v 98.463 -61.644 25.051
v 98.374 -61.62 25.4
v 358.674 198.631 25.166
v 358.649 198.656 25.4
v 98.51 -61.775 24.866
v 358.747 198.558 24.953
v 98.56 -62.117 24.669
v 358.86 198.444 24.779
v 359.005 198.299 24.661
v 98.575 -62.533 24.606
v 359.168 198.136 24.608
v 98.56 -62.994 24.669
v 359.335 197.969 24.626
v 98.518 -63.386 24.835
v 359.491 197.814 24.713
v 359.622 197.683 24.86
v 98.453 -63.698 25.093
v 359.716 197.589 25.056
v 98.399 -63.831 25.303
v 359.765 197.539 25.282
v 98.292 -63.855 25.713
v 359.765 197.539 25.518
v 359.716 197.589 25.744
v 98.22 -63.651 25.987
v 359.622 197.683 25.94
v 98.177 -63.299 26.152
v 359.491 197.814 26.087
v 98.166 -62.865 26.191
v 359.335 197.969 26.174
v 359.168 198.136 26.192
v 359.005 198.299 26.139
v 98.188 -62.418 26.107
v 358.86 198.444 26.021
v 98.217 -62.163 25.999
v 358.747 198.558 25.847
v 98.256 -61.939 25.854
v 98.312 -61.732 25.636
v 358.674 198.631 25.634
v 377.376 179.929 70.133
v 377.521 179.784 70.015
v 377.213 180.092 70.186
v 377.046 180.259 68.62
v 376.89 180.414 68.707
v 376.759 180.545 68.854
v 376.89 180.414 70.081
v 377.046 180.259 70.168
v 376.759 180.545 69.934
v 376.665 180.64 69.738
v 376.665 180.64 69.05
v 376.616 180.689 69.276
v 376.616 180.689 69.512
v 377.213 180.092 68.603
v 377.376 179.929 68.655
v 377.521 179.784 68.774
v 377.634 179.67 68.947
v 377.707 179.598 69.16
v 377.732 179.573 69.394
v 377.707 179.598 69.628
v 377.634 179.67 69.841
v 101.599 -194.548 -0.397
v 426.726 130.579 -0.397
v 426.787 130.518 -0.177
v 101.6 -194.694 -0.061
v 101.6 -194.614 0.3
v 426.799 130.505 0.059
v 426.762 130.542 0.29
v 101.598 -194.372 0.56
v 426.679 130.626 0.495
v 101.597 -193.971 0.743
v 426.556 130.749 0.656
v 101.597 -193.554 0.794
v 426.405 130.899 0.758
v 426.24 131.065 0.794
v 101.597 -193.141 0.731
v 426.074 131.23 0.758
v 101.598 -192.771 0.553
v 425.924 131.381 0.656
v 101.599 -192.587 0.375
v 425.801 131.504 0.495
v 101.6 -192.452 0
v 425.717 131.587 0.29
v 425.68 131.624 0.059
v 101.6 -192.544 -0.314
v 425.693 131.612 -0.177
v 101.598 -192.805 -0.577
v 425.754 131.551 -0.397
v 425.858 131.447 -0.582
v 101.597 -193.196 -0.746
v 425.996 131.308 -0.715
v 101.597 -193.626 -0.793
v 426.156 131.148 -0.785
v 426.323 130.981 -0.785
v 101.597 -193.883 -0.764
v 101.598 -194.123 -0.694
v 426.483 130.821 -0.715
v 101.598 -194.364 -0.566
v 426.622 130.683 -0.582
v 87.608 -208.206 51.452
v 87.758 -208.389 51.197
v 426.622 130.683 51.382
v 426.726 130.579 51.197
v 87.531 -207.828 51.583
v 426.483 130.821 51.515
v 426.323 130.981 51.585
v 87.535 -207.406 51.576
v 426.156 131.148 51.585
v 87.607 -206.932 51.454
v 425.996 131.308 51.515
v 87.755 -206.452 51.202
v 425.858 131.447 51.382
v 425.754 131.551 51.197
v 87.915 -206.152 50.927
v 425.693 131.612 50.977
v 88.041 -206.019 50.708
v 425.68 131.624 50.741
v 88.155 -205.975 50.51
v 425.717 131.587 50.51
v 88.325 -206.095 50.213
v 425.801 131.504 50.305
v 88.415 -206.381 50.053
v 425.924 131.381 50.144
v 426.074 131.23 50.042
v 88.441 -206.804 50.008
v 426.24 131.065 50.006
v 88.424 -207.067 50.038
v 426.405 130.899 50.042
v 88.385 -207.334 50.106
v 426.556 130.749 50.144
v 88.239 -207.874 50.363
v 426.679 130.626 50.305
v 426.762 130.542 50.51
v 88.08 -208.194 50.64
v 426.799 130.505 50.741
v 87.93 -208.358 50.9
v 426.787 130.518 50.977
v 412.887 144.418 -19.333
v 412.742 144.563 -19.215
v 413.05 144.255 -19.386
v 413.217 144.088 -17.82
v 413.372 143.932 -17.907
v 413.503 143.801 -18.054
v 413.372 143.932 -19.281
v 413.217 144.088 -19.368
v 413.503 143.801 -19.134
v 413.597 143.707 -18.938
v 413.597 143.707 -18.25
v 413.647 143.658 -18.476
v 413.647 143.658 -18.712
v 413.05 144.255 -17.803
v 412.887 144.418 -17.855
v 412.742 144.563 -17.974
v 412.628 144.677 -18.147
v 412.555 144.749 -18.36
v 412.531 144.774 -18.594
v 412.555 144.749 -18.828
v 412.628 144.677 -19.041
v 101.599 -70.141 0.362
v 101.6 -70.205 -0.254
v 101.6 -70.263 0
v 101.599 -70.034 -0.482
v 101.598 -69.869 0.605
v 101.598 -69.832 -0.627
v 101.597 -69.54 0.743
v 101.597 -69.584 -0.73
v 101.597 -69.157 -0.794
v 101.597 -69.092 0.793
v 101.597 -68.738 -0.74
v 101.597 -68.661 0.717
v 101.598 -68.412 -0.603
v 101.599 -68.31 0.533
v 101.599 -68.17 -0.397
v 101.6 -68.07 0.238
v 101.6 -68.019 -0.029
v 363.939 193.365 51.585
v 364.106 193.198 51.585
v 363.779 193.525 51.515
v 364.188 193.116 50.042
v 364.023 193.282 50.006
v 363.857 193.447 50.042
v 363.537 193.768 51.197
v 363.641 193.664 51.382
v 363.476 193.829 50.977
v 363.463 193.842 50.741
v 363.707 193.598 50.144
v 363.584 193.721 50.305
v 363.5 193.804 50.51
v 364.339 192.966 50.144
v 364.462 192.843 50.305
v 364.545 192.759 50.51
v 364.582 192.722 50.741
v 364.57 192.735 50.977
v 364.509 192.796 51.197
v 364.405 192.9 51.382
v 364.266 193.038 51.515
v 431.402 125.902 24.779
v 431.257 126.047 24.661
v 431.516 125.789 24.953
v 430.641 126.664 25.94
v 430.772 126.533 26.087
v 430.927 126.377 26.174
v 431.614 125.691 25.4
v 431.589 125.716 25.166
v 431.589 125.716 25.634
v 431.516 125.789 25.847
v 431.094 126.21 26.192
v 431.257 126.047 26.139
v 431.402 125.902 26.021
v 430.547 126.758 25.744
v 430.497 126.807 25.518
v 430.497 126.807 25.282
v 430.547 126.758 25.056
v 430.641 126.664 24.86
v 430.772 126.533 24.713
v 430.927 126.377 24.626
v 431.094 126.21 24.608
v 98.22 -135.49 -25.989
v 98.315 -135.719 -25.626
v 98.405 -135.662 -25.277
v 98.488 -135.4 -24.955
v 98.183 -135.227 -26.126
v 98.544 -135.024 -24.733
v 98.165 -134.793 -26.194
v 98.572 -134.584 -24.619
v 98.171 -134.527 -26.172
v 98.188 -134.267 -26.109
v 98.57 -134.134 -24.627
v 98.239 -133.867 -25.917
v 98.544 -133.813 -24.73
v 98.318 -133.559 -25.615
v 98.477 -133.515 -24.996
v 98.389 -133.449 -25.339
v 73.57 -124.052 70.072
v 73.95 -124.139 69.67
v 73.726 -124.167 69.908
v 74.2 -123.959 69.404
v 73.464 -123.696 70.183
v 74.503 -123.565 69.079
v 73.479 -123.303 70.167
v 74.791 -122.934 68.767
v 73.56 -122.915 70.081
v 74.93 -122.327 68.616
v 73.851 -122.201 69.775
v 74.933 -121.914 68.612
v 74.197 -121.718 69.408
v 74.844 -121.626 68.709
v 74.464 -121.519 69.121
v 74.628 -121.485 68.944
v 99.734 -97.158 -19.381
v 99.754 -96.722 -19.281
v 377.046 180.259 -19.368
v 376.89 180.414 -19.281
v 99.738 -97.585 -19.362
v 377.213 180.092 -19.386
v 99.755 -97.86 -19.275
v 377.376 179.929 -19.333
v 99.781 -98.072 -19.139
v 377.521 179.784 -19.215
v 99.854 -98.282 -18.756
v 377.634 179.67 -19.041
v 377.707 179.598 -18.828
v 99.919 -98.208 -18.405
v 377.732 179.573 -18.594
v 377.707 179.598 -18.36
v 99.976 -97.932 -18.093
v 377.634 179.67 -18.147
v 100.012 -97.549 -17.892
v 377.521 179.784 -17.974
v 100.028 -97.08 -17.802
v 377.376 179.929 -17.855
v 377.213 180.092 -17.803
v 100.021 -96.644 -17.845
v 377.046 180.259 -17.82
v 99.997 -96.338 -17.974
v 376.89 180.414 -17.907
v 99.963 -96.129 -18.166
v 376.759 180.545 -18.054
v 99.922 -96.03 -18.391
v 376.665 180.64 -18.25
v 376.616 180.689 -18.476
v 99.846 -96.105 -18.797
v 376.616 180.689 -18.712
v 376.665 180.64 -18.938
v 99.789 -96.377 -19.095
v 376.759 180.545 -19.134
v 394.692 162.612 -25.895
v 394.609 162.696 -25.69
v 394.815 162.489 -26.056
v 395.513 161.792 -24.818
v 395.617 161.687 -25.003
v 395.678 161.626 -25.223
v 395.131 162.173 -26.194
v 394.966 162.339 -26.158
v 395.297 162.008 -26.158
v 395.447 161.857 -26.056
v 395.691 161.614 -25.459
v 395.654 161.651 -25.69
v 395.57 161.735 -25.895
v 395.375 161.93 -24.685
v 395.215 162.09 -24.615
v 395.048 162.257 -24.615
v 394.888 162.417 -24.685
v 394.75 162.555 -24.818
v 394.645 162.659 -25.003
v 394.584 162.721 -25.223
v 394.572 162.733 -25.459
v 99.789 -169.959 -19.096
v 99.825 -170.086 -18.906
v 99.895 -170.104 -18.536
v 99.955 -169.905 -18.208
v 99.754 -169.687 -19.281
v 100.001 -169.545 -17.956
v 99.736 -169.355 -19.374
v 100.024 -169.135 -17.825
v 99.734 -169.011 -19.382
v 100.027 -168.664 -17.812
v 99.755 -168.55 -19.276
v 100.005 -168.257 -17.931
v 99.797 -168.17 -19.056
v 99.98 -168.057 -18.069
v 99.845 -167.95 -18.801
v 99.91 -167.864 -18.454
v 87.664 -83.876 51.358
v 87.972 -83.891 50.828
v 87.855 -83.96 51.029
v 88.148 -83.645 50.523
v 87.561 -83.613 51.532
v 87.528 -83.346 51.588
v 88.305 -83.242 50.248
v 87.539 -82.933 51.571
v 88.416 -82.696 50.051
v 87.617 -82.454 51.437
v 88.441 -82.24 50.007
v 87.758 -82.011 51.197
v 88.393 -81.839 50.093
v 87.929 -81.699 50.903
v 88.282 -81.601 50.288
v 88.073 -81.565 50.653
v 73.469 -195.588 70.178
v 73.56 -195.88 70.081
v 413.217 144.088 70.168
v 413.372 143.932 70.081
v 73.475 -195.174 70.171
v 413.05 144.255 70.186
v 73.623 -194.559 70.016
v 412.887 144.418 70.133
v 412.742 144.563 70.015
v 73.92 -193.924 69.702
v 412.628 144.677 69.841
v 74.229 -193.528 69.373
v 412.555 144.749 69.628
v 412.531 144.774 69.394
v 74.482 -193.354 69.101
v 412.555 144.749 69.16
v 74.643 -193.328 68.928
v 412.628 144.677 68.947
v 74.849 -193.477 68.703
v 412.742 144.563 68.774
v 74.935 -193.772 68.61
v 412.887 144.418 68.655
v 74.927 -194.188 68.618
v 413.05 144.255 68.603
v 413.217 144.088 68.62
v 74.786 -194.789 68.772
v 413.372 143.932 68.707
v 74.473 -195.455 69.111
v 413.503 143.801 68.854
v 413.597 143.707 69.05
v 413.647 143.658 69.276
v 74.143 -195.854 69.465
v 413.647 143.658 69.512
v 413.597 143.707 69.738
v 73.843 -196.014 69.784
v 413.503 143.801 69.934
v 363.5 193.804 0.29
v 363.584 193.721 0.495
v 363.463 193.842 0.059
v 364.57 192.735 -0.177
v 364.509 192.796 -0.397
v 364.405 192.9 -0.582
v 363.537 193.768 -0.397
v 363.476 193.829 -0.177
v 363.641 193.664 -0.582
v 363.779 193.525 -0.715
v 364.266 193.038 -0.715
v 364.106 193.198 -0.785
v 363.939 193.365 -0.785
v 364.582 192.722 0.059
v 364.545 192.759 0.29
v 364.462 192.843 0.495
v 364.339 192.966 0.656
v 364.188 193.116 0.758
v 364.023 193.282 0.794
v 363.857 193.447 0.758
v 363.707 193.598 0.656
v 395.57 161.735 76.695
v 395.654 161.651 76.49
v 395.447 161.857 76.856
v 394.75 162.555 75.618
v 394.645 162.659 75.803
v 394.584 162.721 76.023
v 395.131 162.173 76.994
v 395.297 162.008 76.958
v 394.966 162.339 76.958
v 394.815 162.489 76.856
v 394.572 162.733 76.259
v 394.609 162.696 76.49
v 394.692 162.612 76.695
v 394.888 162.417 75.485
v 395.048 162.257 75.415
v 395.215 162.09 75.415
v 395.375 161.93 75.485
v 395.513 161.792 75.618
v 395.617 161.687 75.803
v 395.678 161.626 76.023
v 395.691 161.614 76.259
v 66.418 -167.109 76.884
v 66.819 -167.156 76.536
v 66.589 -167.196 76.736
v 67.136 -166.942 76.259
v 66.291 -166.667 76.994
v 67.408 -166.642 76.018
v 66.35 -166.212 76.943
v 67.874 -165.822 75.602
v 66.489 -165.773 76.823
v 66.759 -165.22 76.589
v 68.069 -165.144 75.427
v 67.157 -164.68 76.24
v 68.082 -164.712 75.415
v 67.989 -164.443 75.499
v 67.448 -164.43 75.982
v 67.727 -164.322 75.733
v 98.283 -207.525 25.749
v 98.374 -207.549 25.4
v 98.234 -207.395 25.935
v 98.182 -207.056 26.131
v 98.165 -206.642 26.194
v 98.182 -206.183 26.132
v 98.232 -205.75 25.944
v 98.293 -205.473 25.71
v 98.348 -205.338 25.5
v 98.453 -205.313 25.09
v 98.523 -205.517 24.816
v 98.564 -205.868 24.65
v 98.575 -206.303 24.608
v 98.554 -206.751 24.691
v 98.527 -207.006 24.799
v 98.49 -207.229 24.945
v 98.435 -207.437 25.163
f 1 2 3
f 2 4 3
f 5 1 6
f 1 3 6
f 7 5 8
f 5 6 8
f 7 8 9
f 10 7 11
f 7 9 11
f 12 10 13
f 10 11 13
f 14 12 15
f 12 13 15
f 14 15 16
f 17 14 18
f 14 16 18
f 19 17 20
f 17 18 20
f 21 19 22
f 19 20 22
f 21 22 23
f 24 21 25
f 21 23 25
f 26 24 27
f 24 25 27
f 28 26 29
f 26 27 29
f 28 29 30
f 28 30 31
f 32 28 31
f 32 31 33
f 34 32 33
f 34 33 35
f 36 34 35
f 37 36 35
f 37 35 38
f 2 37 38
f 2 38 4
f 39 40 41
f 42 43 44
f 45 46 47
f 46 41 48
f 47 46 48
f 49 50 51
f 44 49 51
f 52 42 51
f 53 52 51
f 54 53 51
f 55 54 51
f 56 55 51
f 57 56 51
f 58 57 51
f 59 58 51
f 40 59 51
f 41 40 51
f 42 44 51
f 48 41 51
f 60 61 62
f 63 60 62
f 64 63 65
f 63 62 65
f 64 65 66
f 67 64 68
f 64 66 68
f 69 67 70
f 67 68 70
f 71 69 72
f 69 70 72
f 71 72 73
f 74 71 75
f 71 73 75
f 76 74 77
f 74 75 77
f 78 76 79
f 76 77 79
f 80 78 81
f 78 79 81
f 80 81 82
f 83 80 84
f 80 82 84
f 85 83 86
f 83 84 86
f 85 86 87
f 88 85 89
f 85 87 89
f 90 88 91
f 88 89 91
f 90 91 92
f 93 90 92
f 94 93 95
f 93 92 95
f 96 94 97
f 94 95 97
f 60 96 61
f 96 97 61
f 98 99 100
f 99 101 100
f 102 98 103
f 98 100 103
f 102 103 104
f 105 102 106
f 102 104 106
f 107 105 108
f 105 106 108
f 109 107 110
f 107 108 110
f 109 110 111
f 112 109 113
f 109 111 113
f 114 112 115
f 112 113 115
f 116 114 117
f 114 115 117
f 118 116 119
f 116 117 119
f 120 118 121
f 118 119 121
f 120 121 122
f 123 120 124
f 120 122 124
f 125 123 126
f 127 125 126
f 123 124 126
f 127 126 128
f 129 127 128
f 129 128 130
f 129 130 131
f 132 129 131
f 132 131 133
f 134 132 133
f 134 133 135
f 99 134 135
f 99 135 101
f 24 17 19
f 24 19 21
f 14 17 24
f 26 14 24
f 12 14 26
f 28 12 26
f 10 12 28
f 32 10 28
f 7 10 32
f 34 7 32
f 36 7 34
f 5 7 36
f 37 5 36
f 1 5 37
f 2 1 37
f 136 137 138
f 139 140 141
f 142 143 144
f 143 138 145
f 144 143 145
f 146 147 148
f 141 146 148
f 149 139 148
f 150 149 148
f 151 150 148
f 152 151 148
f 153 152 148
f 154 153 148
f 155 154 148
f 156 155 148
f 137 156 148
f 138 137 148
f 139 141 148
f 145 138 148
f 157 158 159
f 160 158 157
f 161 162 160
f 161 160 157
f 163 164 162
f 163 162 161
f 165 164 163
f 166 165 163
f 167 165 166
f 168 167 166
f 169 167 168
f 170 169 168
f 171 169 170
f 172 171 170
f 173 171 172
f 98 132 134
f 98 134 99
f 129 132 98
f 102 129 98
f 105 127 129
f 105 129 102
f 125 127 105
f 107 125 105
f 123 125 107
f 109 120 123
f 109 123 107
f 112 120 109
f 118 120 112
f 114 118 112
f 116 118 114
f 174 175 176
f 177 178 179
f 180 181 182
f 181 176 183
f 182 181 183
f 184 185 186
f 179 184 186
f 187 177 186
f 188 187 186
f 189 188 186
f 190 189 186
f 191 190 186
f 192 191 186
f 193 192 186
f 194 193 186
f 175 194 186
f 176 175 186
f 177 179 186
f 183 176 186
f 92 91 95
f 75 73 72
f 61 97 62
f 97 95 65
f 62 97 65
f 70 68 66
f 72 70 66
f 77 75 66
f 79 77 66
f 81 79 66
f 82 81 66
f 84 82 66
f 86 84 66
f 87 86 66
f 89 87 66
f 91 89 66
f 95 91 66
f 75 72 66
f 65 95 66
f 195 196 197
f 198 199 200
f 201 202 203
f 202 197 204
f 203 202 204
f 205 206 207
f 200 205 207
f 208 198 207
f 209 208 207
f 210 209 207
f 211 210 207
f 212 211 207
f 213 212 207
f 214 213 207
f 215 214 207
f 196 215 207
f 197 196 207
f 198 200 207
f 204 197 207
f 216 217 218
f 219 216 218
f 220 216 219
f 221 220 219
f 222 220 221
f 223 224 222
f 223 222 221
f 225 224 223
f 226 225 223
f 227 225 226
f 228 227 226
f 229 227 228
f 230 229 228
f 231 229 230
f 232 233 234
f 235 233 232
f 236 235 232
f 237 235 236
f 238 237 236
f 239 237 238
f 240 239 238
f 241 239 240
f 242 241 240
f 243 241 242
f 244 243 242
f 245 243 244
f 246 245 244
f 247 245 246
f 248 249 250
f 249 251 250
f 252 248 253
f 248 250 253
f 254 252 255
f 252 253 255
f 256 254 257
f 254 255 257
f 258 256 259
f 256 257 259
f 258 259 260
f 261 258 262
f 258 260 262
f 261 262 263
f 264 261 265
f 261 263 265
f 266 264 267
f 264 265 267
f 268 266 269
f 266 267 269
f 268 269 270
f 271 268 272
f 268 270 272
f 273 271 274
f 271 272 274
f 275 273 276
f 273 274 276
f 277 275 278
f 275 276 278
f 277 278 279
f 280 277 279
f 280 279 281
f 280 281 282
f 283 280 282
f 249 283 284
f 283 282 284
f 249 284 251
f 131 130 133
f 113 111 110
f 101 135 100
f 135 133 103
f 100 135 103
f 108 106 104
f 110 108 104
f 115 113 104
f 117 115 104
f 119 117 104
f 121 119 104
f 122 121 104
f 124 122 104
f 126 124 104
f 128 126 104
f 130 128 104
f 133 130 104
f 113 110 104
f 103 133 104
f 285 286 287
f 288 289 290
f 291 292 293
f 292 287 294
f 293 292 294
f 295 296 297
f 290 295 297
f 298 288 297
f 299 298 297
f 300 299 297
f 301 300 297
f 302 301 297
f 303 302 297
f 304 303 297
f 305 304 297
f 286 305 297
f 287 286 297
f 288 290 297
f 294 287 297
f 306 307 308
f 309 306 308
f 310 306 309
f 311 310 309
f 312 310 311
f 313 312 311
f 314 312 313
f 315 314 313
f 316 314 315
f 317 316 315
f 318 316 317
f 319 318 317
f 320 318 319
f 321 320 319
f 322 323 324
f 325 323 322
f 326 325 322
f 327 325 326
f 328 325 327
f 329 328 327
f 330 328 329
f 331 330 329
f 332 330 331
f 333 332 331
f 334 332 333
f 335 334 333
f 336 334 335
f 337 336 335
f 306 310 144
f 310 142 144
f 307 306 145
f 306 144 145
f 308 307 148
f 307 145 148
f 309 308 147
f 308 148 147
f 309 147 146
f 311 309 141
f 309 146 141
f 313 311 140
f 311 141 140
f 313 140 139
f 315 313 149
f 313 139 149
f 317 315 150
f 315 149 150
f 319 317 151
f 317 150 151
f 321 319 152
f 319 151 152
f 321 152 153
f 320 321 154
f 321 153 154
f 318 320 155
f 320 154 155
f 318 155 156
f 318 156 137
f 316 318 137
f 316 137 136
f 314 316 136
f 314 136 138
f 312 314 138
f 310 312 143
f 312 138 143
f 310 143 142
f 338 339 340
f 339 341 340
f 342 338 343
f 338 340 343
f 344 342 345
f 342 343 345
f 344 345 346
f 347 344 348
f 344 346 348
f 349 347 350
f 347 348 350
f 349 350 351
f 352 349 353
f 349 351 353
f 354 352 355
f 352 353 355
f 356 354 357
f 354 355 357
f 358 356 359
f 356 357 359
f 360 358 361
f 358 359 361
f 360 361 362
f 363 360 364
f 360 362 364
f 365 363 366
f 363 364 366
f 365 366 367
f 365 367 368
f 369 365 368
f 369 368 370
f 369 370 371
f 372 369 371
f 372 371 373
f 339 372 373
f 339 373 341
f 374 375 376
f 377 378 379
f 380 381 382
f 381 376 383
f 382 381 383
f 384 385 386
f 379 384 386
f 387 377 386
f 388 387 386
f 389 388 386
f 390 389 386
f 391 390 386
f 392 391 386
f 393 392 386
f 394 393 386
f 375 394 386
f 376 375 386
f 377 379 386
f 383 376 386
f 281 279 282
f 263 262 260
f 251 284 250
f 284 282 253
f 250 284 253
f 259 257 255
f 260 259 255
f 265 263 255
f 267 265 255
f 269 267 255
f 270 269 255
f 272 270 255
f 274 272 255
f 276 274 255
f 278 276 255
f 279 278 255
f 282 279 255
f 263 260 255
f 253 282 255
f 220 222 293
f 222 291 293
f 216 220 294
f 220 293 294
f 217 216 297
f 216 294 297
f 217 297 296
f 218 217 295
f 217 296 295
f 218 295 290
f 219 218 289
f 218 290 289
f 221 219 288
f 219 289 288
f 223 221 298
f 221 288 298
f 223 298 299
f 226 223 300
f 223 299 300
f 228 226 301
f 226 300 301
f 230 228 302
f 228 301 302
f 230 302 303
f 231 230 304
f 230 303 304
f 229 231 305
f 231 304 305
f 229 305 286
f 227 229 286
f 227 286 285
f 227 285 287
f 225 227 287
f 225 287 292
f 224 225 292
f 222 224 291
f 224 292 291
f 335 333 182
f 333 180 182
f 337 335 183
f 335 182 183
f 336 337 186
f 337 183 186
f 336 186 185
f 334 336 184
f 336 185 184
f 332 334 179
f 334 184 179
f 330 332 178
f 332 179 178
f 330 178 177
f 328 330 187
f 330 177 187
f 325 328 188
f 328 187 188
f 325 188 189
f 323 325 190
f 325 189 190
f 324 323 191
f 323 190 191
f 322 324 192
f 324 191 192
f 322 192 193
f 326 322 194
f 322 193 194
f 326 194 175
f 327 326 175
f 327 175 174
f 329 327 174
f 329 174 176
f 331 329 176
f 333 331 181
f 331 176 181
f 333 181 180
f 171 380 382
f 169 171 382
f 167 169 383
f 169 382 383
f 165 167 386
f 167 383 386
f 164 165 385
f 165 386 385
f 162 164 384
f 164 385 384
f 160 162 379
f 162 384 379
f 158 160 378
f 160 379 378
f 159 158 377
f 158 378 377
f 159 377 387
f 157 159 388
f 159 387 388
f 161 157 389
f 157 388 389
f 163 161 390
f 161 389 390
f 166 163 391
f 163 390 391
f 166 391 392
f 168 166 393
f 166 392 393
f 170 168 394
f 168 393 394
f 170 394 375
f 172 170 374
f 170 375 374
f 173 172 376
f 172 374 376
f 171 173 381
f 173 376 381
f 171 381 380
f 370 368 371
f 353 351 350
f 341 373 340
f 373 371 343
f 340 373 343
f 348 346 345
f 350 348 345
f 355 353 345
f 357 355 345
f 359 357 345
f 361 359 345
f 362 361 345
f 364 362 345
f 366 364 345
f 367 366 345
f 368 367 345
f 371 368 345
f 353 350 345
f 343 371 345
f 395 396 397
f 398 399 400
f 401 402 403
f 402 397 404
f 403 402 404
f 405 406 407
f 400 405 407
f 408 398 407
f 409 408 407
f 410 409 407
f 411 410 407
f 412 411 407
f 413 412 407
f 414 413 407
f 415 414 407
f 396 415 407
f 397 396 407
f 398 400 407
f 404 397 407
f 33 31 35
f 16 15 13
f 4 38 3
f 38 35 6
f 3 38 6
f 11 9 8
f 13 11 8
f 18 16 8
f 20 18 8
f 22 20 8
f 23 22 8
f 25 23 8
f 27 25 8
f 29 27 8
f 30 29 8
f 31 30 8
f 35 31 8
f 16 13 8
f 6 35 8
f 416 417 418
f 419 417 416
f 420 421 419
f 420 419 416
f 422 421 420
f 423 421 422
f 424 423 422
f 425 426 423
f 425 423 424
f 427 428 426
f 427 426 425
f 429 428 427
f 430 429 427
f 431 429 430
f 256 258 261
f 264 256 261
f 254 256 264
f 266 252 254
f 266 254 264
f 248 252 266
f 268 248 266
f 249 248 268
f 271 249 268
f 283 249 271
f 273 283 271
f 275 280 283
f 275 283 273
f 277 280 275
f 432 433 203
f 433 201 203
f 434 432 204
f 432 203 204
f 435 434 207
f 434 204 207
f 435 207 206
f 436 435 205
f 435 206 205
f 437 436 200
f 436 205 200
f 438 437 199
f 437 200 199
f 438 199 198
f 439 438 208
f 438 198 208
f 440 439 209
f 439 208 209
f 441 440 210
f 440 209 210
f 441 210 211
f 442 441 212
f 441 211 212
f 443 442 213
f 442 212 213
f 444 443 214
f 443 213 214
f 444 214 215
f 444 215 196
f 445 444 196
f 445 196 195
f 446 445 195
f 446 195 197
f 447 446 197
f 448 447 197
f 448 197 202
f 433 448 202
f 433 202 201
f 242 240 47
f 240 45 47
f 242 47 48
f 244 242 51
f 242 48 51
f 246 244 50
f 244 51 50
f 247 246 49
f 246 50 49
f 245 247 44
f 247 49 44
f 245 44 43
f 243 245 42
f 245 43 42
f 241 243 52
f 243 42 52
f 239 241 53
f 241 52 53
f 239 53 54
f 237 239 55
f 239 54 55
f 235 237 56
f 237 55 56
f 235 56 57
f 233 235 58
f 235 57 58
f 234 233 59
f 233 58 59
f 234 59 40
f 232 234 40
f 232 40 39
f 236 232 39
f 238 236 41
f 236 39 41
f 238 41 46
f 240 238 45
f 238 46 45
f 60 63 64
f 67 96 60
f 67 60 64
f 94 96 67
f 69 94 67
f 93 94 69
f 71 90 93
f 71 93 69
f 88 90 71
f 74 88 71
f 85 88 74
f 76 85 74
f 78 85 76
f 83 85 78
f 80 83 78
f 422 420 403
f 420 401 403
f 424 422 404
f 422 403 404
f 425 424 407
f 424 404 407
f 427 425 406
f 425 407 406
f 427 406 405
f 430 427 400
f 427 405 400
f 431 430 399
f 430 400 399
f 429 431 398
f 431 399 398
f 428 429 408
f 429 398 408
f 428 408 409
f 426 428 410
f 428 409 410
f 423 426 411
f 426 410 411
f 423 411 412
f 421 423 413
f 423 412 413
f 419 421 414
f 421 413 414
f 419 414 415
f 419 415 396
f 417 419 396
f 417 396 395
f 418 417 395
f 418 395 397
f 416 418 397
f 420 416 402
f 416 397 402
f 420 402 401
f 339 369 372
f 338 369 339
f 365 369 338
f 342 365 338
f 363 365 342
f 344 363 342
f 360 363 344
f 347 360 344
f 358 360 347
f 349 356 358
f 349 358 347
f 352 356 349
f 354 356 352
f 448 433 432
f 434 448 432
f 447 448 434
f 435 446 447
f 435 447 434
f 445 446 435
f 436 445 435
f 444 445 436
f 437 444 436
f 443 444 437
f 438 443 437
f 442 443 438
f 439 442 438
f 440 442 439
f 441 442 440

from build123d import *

# Parameters (mm, degrees)
F5_COUNT = 12
F6_R     = 101.6
F7_DEPTH = 305.3622660076


# Not quite as in the source:
# - the program builds the solid bodies; features that only make, move or delete a surface that nothing else refers to are left out


with BuildPart() as f4:
    # F3 (on offset) → F4 (revolve)
    with BuildSketch(Plane.XY.offset(25.4)):
        Polygon((0, -304.8), (0.5612660076, -305.3612660076), (431.6135598189, 125.6910278038), (431.0522938113, 126.2522938113), align=None)
    revolve(axis=Axis((215.5261469057, -89.2738530943, 25.4), (-0.7071067812, -0.7071067812, 0)))


with BuildPart() as f5_1:
    # F5: instance of F4
    add(f4.part.rotate(Axis((179.6051224214, -53.3528286101, 25.4), (0.7071067812, 0.7071067812, 0)), 1 * 360 / F5_COUNT))


with BuildPart() as f5_2:
    # F5: instance of F4
    add(f4.part.rotate(Axis((179.6051224214, -53.3528286101, 25.4), (0.7071067812, 0.7071067812, 0)), 2 * 360 / F5_COUNT))


with BuildPart() as f5_3:
    # F5: instance of F4
    add(f4.part.rotate(Axis((179.6051224214, -53.3528286101, 25.4), (0.7071067812, 0.7071067812, 0)), 3 * 360 / F5_COUNT))


with BuildPart() as f5_4:
    # F5: instance of F4
    add(f4.part.rotate(Axis((179.6051224214, -53.3528286101, 25.4), (0.7071067812, 0.7071067812, 0)), 4 * 360 / F5_COUNT))


with BuildPart() as f5_5:
    # F5: instance of F4
    add(f4.part.rotate(Axis((179.6051224214, -53.3528286101, 25.4), (0.7071067812, 0.7071067812, 0)), 5 * 360 / F5_COUNT))


with BuildPart() as f5_6:
    # F5: instance of F4
    add(f4.part.rotate(Axis((179.6051224214, -53.3528286101, 25.4), (0.7071067812, 0.7071067812, 0)), 6 * 360 / F5_COUNT))


with BuildPart() as f5_7:
    # F5: instance of F4
    add(f4.part.rotate(Axis((179.6051224214, -53.3528286101, 25.4), (0.7071067812, 0.7071067812, 0)), 7 * 360 / F5_COUNT))


with BuildPart() as f5_8:
    # F5: instance of F4
    add(f4.part.rotate(Axis((179.6051224214, -53.3528286101, 25.4), (0.7071067812, 0.7071067812, 0)), 8 * 360 / F5_COUNT))


with BuildPart() as f5_9:
    # F5: instance of F4
    add(f4.part.rotate(Axis((179.6051224214, -53.3528286101, 25.4), (0.7071067812, 0.7071067812, 0)), 9 * 360 / F5_COUNT))


with BuildPart() as f5_10:
    # F5: instance of F4
    add(f4.part.rotate(Axis((179.6051224214, -53.3528286101, 25.4), (0.7071067812, 0.7071067812, 0)), 10 * 360 / F5_COUNT))


with BuildPart() as f5_11:
    # F5: instance of F4
    add(f4.part.rotate(Axis((179.6051224214, -53.3528286101, 25.4), (0.7071067812, 0.7071067812, 0)), 11 * 360 / F5_COUNT))


with BuildPart() as f7_tool:
    # F6 (on Front) → F7 (new body, through all)
    with BuildSketch(Plane.XZ):
        Circle(F6_R)
    extrude(amount=F7_DEPTH)


with BuildPart() as f4_1:
    add(f4.part)

    # F7: cut by f7_tool
    add(f7_tool.part, mode=Mode.SUBTRACT)


with BuildPart() as f5_1_1:
    add(f5_1.part)

    # F7: cut by f7_tool
    add(f7_tool.part, mode=Mode.SUBTRACT)


with BuildPart() as f5_2_1:
    add(f5_2.part)

    # F7: cut by f7_tool
    add(f7_tool.part, mode=Mode.SUBTRACT)


with BuildPart() as f5_3_1:
    add(f5_3.part)

    # F7: cut by f7_tool
    add(f7_tool.part, mode=Mode.SUBTRACT)


with BuildPart() as f5_4_1:
    add(f5_4.part)

    # F7: cut by f7_tool
    add(f7_tool.part, mode=Mode.SUBTRACT)


with BuildPart() as f5_5_1:
    add(f5_5.part)

    # F7: cut by f7_tool
    add(f7_tool.part, mode=Mode.SUBTRACT)


with BuildPart() as f5_6_1:
    add(f5_6.part)

    # F7: cut by f7_tool
    add(f7_tool.part, mode=Mode.SUBTRACT)


with BuildPart() as f5_7_1:
    add(f5_7.part)

    # F7: cut by f7_tool
    add(f7_tool.part, mode=Mode.SUBTRACT)


with BuildPart() as f5_8_1:
    add(f5_8.part)

    # F7: cut by f7_tool
    add(f7_tool.part, mode=Mode.SUBTRACT)


with BuildPart() as f5_9_1:
    add(f5_9.part)

    # F7: cut by f7_tool
    add(f7_tool.part, mode=Mode.SUBTRACT)


with BuildPart() as f5_10_1:
    add(f5_10.part)

    # F7: cut by f7_tool
    add(f7_tool.part, mode=Mode.SUBTRACT)


with BuildPart() as f5_11_1:
    add(f5_11.part)

    # F7: cut by f7_tool
    add(f7_tool.part, mode=Mode.SUBTRACT)


solid = Compound([f4_1.part, f5_1_1.part, f5_2_1.part, f5_3_1.part, f5_4_1.part, f5_5_1.part, f5_6_1.part, f5_7_1.part, f5_8_1.part, f5_9_1.part, f5_10_1.part, f5_11_1.part])
